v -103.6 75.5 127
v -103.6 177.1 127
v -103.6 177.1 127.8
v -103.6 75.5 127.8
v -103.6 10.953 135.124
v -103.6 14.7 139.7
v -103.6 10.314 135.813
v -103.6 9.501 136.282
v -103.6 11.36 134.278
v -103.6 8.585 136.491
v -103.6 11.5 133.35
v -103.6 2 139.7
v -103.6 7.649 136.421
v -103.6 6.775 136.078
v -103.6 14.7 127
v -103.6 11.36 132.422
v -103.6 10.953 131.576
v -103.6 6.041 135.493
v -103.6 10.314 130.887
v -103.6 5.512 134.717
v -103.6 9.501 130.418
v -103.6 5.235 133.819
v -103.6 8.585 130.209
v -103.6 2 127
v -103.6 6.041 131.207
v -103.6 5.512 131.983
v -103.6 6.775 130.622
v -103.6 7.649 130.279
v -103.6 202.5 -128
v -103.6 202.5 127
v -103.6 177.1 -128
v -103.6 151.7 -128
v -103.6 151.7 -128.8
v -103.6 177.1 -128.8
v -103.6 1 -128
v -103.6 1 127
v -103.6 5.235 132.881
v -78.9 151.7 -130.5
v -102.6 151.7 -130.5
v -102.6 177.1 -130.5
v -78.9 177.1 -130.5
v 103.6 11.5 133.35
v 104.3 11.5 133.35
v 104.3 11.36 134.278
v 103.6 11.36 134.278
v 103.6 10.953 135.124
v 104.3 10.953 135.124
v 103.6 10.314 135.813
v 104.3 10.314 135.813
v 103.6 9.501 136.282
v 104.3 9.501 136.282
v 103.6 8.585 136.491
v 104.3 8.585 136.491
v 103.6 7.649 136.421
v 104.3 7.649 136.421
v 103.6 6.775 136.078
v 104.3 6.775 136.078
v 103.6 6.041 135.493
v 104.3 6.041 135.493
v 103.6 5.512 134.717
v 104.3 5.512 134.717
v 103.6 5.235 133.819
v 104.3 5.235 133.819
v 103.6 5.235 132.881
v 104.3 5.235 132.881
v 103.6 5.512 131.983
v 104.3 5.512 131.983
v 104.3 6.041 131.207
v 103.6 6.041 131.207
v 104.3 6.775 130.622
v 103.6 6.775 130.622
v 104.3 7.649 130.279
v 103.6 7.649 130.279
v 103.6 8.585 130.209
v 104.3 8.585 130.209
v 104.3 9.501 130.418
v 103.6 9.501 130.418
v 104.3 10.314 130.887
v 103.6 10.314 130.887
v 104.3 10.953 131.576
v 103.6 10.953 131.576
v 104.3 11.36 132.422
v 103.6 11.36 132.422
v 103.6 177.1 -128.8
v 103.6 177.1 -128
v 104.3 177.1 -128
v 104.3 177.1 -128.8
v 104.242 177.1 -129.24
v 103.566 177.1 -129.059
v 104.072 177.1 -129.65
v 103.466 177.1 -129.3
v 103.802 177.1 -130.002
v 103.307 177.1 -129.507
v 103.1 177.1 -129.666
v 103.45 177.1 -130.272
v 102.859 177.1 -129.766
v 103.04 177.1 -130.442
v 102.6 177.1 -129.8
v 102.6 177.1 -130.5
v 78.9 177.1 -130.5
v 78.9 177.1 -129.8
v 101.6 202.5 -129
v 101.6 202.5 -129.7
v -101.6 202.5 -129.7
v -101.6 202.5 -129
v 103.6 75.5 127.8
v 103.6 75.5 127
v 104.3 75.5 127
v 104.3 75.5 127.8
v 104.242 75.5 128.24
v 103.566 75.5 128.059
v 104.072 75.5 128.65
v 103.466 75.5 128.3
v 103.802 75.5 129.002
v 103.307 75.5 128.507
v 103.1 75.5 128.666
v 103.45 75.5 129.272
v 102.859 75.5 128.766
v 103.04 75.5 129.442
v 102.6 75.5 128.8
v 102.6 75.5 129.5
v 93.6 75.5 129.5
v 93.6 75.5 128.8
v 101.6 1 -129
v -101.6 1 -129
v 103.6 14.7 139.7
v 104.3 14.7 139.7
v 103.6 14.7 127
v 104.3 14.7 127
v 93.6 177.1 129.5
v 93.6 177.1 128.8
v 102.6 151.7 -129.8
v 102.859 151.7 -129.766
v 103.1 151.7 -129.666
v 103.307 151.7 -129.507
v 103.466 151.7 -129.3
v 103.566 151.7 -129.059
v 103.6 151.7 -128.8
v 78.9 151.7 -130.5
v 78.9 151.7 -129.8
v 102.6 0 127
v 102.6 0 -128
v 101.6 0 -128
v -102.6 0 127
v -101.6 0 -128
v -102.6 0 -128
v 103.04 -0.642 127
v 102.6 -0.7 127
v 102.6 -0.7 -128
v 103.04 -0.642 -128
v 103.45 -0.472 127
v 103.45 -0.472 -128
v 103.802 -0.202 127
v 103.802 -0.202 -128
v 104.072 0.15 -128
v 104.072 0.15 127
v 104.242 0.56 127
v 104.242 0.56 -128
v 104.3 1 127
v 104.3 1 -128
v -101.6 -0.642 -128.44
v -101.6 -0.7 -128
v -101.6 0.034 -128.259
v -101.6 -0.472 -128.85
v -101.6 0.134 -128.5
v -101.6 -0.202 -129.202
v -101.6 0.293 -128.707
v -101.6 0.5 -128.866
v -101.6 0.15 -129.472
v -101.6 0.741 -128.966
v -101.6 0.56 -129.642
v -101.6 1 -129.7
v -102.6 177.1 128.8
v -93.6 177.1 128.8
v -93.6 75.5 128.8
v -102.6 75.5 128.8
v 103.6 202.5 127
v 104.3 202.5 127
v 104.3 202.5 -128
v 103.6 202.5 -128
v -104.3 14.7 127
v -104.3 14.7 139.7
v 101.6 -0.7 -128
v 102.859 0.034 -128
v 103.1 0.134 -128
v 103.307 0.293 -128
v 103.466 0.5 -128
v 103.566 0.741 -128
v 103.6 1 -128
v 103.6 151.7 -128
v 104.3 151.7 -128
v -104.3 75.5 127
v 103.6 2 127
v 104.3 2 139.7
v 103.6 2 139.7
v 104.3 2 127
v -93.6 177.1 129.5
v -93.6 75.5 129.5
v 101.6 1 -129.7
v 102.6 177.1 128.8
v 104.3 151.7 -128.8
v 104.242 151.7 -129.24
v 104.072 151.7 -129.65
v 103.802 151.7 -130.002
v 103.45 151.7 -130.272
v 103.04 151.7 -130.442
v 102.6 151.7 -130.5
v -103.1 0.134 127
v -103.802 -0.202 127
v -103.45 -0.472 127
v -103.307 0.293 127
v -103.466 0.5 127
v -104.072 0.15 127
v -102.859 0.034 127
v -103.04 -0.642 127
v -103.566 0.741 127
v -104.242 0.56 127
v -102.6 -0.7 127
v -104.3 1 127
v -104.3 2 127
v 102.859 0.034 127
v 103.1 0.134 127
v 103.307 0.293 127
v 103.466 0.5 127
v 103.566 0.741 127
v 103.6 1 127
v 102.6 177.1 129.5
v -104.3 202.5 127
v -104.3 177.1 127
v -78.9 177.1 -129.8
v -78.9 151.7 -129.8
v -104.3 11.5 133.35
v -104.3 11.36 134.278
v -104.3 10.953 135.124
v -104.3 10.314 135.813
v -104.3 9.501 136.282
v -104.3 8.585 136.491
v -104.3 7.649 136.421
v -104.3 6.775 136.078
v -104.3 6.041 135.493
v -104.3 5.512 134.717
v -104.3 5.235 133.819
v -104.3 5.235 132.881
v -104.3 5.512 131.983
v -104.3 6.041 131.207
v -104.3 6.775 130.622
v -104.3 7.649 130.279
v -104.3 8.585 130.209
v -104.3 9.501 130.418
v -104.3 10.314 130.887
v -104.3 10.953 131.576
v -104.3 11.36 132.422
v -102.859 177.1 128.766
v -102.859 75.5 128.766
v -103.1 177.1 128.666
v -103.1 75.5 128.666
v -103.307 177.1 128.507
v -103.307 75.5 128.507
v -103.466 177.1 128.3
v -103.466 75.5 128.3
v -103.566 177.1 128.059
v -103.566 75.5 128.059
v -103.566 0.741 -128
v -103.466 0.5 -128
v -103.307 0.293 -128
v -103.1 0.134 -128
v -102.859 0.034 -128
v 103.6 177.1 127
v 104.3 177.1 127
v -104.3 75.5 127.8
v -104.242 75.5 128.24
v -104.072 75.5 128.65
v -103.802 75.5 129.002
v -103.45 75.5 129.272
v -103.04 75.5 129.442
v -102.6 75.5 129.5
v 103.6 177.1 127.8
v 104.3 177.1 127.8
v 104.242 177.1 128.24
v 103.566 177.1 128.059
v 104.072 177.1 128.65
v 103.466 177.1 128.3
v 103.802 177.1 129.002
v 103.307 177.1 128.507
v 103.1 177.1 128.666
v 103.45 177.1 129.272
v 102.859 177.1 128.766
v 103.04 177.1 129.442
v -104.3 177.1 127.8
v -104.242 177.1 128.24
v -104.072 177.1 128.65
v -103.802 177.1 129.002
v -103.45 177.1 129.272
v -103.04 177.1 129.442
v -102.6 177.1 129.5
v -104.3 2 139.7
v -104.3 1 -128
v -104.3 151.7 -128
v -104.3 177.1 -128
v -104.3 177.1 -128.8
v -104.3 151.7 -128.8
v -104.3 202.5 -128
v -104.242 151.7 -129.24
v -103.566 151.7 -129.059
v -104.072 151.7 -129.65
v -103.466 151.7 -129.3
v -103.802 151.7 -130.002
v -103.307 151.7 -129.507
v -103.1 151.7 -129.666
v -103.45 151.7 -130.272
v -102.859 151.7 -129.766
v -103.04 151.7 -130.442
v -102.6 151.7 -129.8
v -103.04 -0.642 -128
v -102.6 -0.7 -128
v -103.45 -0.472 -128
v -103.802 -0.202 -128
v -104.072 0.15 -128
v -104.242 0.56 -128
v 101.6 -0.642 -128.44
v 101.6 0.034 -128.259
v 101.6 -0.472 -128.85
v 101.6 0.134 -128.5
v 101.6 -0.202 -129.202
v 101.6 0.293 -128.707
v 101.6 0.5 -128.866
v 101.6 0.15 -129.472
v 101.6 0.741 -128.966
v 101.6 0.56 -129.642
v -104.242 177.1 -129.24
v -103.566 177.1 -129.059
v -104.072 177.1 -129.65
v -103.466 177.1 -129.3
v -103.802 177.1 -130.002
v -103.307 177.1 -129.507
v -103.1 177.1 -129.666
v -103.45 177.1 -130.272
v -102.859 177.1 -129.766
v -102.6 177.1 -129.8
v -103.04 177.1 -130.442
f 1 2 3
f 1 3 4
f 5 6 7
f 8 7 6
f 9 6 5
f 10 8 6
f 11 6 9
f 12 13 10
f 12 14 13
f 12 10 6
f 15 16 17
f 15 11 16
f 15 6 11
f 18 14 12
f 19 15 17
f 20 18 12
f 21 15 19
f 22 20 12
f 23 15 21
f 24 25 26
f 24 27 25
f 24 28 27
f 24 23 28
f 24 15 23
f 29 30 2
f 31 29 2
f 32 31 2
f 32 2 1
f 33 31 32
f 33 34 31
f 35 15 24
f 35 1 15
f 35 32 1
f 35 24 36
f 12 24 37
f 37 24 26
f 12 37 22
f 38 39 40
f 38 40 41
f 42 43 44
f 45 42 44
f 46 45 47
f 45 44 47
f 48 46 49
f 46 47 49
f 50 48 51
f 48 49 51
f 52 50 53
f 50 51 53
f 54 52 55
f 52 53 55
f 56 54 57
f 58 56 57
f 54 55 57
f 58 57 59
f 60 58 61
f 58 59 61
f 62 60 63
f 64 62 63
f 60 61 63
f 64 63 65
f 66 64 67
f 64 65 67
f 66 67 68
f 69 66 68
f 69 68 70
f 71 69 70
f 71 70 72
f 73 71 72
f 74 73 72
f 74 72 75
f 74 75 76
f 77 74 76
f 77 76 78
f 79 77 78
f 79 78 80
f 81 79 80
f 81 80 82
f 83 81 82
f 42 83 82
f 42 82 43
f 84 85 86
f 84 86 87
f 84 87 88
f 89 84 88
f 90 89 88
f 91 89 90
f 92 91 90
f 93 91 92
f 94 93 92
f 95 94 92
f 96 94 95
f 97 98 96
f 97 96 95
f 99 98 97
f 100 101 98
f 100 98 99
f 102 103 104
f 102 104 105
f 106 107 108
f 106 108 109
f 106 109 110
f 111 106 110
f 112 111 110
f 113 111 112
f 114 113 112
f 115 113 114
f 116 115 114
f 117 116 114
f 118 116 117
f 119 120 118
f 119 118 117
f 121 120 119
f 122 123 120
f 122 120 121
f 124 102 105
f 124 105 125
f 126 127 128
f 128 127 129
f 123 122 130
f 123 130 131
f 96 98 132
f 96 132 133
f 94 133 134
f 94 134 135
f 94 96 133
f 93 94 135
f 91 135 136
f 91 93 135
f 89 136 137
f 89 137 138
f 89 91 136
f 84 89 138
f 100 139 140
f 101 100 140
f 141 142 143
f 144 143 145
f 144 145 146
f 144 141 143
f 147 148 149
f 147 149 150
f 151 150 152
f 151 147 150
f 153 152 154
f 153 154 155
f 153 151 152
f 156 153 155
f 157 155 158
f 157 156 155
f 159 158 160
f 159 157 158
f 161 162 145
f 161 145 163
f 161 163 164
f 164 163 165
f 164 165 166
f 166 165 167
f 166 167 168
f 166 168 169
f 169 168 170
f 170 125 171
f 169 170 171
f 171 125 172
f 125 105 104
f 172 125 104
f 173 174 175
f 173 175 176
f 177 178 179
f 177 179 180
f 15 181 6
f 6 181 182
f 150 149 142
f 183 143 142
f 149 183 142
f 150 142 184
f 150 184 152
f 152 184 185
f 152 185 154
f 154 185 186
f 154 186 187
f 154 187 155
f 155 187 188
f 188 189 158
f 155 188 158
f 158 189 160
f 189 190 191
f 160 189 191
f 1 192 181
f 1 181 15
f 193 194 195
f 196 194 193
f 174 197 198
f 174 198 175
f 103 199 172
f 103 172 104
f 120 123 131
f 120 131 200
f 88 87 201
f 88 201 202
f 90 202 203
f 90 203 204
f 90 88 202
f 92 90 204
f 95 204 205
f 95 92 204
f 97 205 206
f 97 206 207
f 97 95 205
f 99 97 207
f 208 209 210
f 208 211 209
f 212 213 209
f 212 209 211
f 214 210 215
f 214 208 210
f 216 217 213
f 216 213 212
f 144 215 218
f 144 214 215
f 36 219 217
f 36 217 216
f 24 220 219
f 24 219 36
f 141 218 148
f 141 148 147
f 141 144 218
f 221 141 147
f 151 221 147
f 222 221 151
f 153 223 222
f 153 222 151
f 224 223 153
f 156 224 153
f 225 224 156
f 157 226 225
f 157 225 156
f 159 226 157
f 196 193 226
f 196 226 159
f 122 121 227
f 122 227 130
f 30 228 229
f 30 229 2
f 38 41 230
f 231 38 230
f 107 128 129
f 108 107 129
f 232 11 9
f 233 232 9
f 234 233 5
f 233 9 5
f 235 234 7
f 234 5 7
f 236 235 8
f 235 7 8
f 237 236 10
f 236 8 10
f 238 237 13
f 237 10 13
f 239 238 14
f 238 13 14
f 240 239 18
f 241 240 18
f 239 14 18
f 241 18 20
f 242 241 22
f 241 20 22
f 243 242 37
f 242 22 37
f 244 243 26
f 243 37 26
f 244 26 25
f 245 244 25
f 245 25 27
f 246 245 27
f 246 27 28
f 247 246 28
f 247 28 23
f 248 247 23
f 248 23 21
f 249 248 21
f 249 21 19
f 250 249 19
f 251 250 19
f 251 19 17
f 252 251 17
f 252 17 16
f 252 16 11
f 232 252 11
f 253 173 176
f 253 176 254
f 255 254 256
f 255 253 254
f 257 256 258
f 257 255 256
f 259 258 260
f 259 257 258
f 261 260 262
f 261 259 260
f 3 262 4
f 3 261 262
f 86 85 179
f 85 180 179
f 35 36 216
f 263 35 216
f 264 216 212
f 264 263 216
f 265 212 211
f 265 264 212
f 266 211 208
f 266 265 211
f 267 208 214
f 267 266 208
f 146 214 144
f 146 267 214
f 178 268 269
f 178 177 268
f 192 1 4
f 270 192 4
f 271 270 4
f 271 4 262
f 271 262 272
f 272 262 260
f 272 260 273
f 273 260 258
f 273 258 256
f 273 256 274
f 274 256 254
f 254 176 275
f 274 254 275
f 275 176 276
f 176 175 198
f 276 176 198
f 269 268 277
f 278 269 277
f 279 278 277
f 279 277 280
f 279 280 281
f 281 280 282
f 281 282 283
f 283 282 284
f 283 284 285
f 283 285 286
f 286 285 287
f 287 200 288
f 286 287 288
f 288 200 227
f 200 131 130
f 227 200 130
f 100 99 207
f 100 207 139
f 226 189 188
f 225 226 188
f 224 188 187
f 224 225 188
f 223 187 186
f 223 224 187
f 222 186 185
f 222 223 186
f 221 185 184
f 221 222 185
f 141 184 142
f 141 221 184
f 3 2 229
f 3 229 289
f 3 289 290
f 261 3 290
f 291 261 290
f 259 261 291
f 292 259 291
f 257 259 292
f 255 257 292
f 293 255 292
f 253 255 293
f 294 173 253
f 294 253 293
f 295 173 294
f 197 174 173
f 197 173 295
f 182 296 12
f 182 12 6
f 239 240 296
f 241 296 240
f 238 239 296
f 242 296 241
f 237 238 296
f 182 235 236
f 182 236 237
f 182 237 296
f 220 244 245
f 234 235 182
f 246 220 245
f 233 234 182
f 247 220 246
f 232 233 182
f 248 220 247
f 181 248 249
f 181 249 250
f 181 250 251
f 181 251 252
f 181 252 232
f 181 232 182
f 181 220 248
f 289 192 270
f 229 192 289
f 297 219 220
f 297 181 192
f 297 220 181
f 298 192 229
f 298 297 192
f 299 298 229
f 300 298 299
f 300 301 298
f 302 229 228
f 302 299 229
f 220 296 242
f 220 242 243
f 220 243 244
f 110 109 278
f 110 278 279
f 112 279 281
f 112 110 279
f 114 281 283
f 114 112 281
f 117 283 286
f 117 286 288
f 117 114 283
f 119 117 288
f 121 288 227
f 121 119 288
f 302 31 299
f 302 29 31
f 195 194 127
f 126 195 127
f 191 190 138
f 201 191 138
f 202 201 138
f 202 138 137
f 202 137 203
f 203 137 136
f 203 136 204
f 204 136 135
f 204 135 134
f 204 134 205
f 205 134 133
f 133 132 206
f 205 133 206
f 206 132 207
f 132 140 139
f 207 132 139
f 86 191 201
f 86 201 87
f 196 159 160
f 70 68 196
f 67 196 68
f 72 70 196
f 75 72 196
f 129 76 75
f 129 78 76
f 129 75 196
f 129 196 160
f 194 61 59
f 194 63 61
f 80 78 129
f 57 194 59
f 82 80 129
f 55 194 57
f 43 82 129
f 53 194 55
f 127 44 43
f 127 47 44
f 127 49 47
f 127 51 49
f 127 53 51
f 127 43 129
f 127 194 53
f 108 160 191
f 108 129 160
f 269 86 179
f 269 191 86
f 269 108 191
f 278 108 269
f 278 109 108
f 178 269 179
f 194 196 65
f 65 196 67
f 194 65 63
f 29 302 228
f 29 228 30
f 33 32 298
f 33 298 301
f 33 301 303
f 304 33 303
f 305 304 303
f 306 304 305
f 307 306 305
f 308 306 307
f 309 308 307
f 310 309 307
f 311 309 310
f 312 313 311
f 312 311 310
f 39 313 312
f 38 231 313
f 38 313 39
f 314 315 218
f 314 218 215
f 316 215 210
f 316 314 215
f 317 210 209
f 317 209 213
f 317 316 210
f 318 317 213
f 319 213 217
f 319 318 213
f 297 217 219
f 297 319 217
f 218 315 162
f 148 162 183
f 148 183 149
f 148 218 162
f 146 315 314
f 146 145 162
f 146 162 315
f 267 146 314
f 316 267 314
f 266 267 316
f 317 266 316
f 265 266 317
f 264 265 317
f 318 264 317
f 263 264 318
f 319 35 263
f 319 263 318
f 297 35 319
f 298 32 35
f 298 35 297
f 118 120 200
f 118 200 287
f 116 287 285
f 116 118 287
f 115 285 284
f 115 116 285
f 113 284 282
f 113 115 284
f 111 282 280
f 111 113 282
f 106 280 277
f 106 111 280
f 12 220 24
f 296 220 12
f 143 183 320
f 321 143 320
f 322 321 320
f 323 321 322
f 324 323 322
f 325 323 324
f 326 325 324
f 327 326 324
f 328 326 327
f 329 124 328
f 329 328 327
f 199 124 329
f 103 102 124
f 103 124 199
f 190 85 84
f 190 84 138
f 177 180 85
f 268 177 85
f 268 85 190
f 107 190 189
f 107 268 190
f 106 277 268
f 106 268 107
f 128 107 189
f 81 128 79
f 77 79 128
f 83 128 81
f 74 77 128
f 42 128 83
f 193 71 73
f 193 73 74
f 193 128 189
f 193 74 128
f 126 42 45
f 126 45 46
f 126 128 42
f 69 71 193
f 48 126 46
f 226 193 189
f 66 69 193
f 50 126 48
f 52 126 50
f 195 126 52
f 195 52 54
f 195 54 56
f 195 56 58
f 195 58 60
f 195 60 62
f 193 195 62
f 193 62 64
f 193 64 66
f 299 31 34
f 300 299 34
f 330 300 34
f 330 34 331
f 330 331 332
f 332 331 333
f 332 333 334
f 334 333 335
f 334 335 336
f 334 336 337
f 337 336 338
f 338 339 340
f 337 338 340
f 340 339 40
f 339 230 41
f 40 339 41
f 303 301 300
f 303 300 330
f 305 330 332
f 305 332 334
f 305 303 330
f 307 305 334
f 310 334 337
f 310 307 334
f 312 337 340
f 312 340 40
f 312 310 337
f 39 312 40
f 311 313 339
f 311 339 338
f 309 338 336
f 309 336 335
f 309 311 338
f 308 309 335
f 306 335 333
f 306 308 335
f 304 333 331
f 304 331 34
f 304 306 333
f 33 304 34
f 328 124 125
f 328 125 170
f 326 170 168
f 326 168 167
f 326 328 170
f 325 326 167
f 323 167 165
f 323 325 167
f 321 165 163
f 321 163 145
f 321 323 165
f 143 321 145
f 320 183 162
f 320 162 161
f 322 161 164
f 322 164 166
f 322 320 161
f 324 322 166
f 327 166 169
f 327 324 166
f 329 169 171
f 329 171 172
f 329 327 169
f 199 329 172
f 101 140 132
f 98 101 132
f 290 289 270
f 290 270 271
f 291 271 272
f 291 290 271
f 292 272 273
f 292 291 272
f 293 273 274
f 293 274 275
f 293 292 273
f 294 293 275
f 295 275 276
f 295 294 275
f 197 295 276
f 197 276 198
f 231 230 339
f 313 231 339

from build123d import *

# Parameters (mm, degrees)
SKETCH2_W           = 203.2
SKETCH2_H           = 254
BASE_FLANGE1_DEPTH  = 0.7
EDGE_FLANGE4_DEPTH  = 203.2
EDGE_FLANGE5_DEPTH  = 255
EDGE_FLANGE6_DEPTH  = 255
EDGE_FLANGE7_DEPTH  = 25.4
EDGE_FLANGE9_DEPTH  = 25.4
EDGE_FLANGE10_DEPTH = 101.6
EDGE_FLANGE11_DEPTH = 101.6
SKETCH76_W          = 12.7
SKETCH76_H          = 12.7
TAB1_DEPTH          = 0.7
SKETCH79_W          = 12.7
SKETCH79_H          = 12.7
TAB2_DEPTH          = 0.7
SKETCH86_R          = 3.15
CUT_EXTRUDE3_DEPTH  = 323.546585783


# Sheet-metal steps are written as plain solids
with BuildPart() as part:
    # Sketch2 → Base-Flange1 (new body)
    with BuildSketch(Plane(origin=(0, 0, 0), x_dir=(1, 0, 0), z_dir=(0, 1, 0))):
        Rectangle(SKETCH2_W, SKETCH2_H)
    extrude(amount=-BASE_FLANGE1_DEPTH)

    # Edge-Flange4 section (across the edge) → Edge-Flange4 (add)
    with BuildSketch(Plane(origin=(101.6, 0, -129), x_dir=(0, 0, 1), z_dir=(-1, 0, 0))):
        with BuildLine():
            Line((-0.7, 1), (-0.7, 202.5))
            Line((-0.7, 202.5), (0, 202.5))
            Line((0, 202.5), (0, 1))
            ThreePointArc((0, 1), (0.292893219, 0.292893219), (1, 0))
            Line((1, 0), (2, 0))
            Line((2, 0), (2, -0.7))
            Line((2, -0.7), (1, -0.7))
            ThreePointArc((1, -0.7), (-0.202081528, -0.202081528), (-0.7, 1))
        make_face()
    extrude(amount=EDGE_FLANGE4_DEPTH)

    # Edge-Flange5 section (across the edge) → Edge-Flange5 (add)
    with BuildSketch(Plane(origin=(-103.6, 0, -128), x_dir=(1, 0, 0), z_dir=(0, 0, 1))):
        with BuildLine():
            Line((-0.7, 1), (-0.7, 202.5))
            Line((-0.7, 202.5), (0, 202.5))
            Line((0, 202.5), (0, 1))
            ThreePointArc((0, 1), (0.292893219, 0.292893219), (1, 0))
            Line((1, 0), (2, 0))
            Line((2, 0), (2, -0.7))
            Line((2, -0.7), (1, -0.7))
            ThreePointArc((1, -0.7), (-0.202081528, -0.202081528), (-0.7, 1))
        make_face()
    extrude(amount=EDGE_FLANGE5_DEPTH)

    # Edge-Flange6 section (across the edge) → Edge-Flange6 (add)
    with BuildSketch(Plane(origin=(103.6, 0, 127), x_dir=(-1, 0, 0), z_dir=(0, 0, -1))):
        with BuildLine():
            Line((-0.7, 1), (-0.7, 202.5))
            Line((-0.7, 202.5), (0, 202.5))
            Line((0, 202.5), (0, 1))
            ThreePointArc((0, 1), (0.292893219, 0.292893219), (1, 0))
            Line((1, 0), (2, 0))
            Line((2, 0), (2, -0.7))
            Line((2, -0.7), (1, -0.7))
            ThreePointArc((1, -0.7), (-0.202081528, -0.202081528), (-0.7, 1))
        make_face()
    extrude(amount=EDGE_FLANGE6_DEPTH)

    # Edge-Flange7 section (across the edge) → Edge-Flange7 (add)
    with BuildSketch(Plane(origin=(-103.6, 151.7, -129.8), x_dir=(0, 0, 1), z_dir=(0, 1, 0))):
        with BuildLine():
            Line((-0.7, 1), (-0.7, 24.7))
            Line((-0.7, 24.7), (0, 24.7))
            Line((0, 24.7), (0, 1))
            ThreePointArc((0, 1), (0.292893219, 0.292893219), (1, 0))
            Line((1, 0), (1.8, 0))
            Line((1.8, 0), (1.8, -0.7))
            Line((1.8, -0.7), (1, -0.7))
            ThreePointArc((1, -0.7), (-0.202081528, -0.202081528), (-0.7, 1))
        make_face()
    extrude(amount=EDGE_FLANGE7_DEPTH)

    # Edge-Flange9 section (across the edge) → Edge-Flange9 (add)
    with BuildSketch(Plane(origin=(103.6, 177.1, -129.8), x_dir=(0, 0, 1), z_dir=(0, -1, 0))):
        with BuildLine():
            Line((-0.7, 1), (-0.7, 24.7))
            Line((-0.7, 24.7), (0, 24.7))
            Line((0, 24.7), (0, 1))
            ThreePointArc((0, 1), (0.292893219, 0.292893219), (1, 0))
            Line((1, 0), (1.8, 0))
            Line((1.8, 0), (1.8, -0.7))
            Line((1.8, -0.7), (1, -0.7))
            ThreePointArc((1, -0.7), (-0.202081528, -0.202081528), (-0.7, 1))
        make_face()
    extrude(amount=EDGE_FLANGE9_DEPTH)

    # Edge-Flange10 section (across the edge) → Edge-Flange10 (add)
    with BuildSketch(Plane(origin=(103.6, 75.5, 128.8), x_dir=(0, 0, -1), z_dir=(0, 1, 0))):
        with BuildLine():
            Line((-0.7, 1), (-0.7, 10))
            Line((-0.7, 10), (0, 10))
            Line((0, 10), (0, 1))
            ThreePointArc((0, 1), (0.292893219, 0.292893219), (1, 0))
            Line((1, 0), (1.8, 0))
            Line((1.8, 0), (1.8, -0.7))
            Line((1.8, -0.7), (1, -0.7))
            ThreePointArc((1, -0.7), (-0.202081528, -0.202081528), (-0.7, 1))
        make_face()
    extrude(amount=EDGE_FLANGE10_DEPTH)

    # Edge-Flange11 section (across the edge) → Edge-Flange11 (add)
    with BuildSketch(Plane(origin=(-103.6, 177.1, 128.8), x_dir=(0, 0, -1), z_dir=(0, -1, 0))):
        with BuildLine():
            Line((-0.7, 1), (-0.7, 10))
            Line((-0.7, 10), (0, 10))
            Line((0, 10), (0, 1))
            ThreePointArc((0, 1), (0.292893219, 0.292893219), (1, 0))
            Line((1, 0), (1.8, 0))
            Line((1.8, 0), (1.8, -0.7))
            Line((1.8, -0.7), (1, -0.7))
            ThreePointArc((1, -0.7), (-0.202081528, -0.202081528), (-0.7, 1))
        make_face()
    extrude(amount=EDGE_FLANGE11_DEPTH)

    # Sketch76 → Tab1 (add)
    with BuildSketch(Plane.ZY.offset(104.3)):
        with Locations((133.35, 8.35)):
            Rectangle(SKETCH76_W, SKETCH76_H)
    extrude(amount=-TAB1_DEPTH)

    # Sketch79 → Tab2 (add)
    with BuildSketch(Plane(origin=(104.3, 0, 0), x_dir=(0, 0, -1), z_dir=(1, 0, 0))):
        with Locations((-133.35, 8.35)):
            Rectangle(SKETCH79_W, SKETCH79_H)
    extrude(amount=-TAB2_DEPTH)

    # Sketch86 → Cut-Extrude3 (cut, through all)
    with BuildSketch(Plane(origin=(104.3, 0, 0), x_dir=(0, 0, -1), z_dir=(1, 0, 0))):
        with Locations(Location((-133.35, 8.35, 0), (0, 0, 90))):
            Circle(SKETCH86_R)
    extrude(amount=-CUT_EXTRUDE3_DEPTH, mode=Mode.SUBTRACT)


solid = part.part
